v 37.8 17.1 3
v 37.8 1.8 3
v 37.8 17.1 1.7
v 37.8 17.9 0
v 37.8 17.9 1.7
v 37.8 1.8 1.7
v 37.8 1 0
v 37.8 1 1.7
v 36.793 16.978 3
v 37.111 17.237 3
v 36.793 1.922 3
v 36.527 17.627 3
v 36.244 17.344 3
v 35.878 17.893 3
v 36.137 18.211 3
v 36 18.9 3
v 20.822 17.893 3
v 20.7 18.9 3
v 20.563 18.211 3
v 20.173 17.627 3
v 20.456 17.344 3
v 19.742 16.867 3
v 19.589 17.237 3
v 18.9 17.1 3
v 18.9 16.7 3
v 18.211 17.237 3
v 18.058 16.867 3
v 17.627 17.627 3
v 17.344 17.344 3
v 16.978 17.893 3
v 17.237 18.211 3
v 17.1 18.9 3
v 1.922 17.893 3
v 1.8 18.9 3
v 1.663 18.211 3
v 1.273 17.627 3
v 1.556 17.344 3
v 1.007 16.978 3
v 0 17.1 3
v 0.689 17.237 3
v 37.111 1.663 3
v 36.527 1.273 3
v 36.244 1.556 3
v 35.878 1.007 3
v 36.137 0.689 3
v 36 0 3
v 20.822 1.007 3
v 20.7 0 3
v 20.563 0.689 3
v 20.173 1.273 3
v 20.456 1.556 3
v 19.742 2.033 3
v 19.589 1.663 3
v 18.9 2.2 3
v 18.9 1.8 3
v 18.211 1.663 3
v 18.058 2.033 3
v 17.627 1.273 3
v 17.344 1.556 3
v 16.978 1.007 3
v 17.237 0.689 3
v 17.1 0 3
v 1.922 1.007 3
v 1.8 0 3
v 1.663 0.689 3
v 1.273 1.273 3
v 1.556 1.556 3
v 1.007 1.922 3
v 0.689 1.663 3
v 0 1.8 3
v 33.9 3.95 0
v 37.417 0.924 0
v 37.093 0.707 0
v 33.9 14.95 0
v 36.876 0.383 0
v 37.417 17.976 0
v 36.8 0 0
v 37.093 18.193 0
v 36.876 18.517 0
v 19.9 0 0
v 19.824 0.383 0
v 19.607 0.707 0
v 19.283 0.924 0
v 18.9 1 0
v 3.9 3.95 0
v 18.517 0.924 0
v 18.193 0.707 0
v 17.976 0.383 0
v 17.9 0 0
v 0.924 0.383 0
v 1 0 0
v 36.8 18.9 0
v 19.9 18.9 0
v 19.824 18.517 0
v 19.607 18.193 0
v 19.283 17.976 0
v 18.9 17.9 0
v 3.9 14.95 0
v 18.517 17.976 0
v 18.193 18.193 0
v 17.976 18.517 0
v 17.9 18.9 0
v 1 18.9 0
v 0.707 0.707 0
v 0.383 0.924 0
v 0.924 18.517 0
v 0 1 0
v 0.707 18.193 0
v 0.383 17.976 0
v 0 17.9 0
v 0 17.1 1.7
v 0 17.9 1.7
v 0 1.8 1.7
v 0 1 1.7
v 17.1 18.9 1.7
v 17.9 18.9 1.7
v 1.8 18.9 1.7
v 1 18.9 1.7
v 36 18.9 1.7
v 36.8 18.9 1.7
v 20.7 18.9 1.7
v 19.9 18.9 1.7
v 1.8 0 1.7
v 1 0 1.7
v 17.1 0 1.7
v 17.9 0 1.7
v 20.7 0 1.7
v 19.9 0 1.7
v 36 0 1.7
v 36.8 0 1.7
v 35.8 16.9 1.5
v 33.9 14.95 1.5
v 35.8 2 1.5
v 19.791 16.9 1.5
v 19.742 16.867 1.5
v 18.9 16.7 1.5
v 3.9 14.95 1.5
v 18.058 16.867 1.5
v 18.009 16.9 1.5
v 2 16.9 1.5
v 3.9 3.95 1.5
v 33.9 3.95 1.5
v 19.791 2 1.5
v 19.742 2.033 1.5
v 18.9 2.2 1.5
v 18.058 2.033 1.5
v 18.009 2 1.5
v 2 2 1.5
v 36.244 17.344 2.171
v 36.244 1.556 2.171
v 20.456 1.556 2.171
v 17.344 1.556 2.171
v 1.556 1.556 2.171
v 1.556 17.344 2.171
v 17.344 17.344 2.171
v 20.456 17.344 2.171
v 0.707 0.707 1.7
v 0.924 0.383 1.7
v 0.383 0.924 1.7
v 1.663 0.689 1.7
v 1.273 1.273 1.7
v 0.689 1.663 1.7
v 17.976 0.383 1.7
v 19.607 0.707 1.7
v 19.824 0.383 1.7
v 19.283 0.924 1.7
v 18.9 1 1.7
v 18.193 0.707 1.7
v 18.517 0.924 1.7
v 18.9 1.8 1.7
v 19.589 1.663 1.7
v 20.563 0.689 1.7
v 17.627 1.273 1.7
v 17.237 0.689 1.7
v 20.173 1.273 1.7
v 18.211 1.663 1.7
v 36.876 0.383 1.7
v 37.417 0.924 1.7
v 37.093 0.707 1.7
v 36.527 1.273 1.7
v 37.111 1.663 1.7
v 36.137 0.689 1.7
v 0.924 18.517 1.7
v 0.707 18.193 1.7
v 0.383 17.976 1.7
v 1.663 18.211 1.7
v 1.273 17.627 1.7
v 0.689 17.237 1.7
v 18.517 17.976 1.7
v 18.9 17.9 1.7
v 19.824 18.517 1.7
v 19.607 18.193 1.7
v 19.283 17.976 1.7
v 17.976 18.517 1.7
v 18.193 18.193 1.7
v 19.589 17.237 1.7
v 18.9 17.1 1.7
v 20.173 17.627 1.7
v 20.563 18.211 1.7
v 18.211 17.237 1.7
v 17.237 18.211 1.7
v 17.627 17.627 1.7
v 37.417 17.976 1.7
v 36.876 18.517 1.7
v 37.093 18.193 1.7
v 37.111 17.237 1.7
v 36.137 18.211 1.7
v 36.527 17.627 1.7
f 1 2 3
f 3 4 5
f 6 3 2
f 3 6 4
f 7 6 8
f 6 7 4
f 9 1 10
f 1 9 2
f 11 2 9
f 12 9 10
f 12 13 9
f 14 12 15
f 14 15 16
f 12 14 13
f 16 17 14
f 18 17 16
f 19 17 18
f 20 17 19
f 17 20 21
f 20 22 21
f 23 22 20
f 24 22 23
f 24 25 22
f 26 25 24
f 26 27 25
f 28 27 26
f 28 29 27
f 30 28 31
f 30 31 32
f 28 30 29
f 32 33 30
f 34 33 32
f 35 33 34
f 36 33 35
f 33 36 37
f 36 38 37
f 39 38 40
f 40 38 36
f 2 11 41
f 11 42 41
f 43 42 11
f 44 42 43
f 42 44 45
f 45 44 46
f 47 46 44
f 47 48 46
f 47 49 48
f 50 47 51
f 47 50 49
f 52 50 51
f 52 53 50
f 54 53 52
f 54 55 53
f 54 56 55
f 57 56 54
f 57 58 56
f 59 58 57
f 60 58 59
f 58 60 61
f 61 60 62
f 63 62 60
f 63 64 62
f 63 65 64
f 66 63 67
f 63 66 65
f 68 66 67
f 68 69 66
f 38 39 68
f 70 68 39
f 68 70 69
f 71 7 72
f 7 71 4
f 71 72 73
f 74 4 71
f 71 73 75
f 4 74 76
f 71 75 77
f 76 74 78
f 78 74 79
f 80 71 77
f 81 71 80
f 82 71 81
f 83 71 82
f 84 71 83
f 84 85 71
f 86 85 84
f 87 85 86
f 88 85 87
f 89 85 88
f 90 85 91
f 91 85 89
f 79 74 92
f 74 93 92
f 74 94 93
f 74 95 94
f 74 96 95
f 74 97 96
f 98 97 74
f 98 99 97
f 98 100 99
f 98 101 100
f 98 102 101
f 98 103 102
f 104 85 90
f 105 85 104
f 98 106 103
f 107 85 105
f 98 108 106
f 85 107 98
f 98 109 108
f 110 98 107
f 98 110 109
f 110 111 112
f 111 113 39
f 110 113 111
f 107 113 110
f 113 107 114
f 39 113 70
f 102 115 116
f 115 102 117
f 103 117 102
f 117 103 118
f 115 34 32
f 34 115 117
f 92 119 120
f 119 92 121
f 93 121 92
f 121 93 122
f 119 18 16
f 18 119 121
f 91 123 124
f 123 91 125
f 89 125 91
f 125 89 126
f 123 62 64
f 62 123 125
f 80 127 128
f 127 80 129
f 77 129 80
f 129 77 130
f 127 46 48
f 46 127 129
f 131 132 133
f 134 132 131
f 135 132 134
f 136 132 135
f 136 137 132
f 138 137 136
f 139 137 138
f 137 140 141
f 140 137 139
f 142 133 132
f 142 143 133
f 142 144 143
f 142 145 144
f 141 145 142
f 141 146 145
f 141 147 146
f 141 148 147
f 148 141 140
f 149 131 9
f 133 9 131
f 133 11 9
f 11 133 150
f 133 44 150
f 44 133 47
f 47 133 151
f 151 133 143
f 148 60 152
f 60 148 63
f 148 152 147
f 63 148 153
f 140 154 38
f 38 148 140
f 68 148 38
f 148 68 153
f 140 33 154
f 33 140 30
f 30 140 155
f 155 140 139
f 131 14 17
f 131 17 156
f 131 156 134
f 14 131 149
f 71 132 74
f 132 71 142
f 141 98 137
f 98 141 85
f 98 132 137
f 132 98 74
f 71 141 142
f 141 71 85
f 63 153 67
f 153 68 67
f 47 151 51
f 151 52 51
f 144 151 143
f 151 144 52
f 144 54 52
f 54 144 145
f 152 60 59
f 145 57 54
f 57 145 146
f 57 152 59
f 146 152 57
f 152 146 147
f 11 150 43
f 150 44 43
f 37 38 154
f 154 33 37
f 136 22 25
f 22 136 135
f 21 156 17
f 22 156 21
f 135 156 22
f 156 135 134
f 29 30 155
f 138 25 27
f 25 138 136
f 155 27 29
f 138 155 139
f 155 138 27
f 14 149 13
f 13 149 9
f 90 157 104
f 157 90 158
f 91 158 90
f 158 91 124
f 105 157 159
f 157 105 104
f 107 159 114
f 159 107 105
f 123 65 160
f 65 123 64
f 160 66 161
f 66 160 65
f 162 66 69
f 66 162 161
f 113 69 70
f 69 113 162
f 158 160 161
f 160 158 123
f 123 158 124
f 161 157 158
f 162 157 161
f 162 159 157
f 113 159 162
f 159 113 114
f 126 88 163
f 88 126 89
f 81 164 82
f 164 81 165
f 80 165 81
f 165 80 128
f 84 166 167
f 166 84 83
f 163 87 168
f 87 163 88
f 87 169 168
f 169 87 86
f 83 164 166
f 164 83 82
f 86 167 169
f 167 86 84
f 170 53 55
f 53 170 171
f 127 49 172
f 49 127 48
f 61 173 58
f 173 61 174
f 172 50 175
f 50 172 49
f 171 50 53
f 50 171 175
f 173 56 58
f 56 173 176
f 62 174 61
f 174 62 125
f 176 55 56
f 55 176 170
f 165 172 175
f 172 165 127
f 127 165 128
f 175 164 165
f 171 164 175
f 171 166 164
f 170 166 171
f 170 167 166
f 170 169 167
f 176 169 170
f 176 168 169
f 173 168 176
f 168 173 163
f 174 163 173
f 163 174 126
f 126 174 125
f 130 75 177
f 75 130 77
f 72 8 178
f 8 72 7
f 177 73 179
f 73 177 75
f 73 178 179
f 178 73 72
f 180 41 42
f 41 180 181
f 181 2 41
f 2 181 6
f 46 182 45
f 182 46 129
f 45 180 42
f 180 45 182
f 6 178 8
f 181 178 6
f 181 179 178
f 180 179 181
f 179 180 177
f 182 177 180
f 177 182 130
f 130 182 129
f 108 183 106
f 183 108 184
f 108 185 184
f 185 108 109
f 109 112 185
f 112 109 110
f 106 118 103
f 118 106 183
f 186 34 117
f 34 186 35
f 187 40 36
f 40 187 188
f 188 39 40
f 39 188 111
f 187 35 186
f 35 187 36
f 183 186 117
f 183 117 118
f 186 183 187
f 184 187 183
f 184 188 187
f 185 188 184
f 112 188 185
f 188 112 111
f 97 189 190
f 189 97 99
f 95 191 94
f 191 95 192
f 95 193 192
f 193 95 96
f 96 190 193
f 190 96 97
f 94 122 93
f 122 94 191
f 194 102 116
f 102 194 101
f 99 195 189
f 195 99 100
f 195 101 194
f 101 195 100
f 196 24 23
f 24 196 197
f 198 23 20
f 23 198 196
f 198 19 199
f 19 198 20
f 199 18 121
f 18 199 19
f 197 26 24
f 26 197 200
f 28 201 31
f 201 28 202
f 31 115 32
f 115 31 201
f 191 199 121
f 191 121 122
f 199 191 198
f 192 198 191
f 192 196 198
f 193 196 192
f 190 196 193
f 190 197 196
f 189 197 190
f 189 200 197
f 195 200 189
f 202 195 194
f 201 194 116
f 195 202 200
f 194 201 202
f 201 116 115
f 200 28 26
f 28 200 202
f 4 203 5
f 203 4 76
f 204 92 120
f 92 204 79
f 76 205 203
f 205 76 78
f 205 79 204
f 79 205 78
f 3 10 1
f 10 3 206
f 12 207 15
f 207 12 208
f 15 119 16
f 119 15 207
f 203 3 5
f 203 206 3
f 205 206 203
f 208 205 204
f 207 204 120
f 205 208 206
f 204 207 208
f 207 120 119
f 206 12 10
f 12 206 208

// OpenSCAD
//OpenSCAD-Skript

//Moduldefinition mit Parametern für Frontplattensystem im 19mm-Raster
module FrontElem (
//Parameter
xwert=2,        //Anzahl der Segmente in horizontaler Richtung
ywert=1,        //Anzahl der Segmente in vertikaler Richtung
segment=18.9,   //Kantenlänge des Segments
hght=3.0,       //Höhe des Rands des Frontplattensegments
thick=1.5,      //verbleibende Dicke des Frontplattensegments
wo=1.0,         //Wandstärke oben
wu=2.0,         //Wandstärke unten
M3=false,       //Bohrungen für M3-Zylinderkopf-Inbusschraube
skd3=5.6,       //Schraubenkopfdurchmesser M3-Schraube
skh3=3.3,       //Schraubenkopfhöhe M3-Schraube
dsh3=3.1,       //Schaftdurchmesser M3-Schraube
dvst3=7,        //Verstärkung für M3-Schraube
B2mm=true,      //Bohrungen für 2mm-Schneidschrauben
skd2=3.6,       //Schraubenkopfdurchmesser 2mm-Schraube (4.4)
skh2=1.3,       //Schraubenkopfhöhe 2mm-Schraube
dsh2=2.0,       //Schaftdurchmesser 2mm-Schraube
dvst2=4.4,      //Verstärkung für 2mm-Schraube
Btext=6.0,      //Breite Beschriftungsband
Ltext=12,       //Länge Beschriftungsband
Dtext=0.3,      //Tiefe Beschriftungsfeld, oder Null
LEDdia=3.0,     //Durchmesser LED
LEDr=5.0,       //Kantenlänge quadratische LED
LEDB=5.0,       //Breite der Rechteck-LED
LEDH=3.0,       //Höhe der Rechteck-LED
KSWdia=6.0,     //Schaftdurchmesser Kippschalter
RSWdia=9.2,     //Schaftdurchmesser Drehschalter
RSWdist=9.4,    //Mittenabstand Pin
RSWpin=3.0,     //Durchmesser Pin
POTdia=6.8,     //Schaftdurchmesser Poti
TRMdia=4.0,     //Bohrung für Polklemme M4
TRSdia=6.0,     //Bohrung für Telefonbuchse 4mm
MCdia=11.8,     //Bohrung für MC-Buchse 4mm
MCdist=10.4,    //Abstand Abflachungen
BNCdia=9.5,     //Durchmesser Bohrung
BNCdist=8.0,    //Abstand Abflachung
PM3B=22.5,      //Breite Panelmeter 3-stellig
PM3H=14.5,      //Höhe Panelmeter 3-stellig
PM4B=30.0,      //Breite Panelmeter 4-stellig
PM4H=14.2      //Höhe Panelmeter 4-stellig

)
//Beginn Modul
{
difference(){   //difference 1
union(){        //union 1
difference(){   //difference 2
union(){        //union 2
    //alles, was vor der nächsten geschweiften Klammer steht, wird zusammengefügt (union 2)
//Körper des Frontplattensegments
cube([xwert*segment, ywert*segment, hght]);


}               //union 2 end
    //alles, was vor der nächsten geschweiften Klammer steht, wird davon abgezogen (difference 2)
//Einsenkung in das Segment
polyhedron(
               points= [[wu,wu,thick],                                  //0 unten
                        [xwert*segment-wu,wu,thick],                    //1 unten
                        [xwert*segment-wu,ywert*segment-wu,thick],      //2 unten
                        [wu,ywert*segment-wu,thick],                    //3 unten
                        [wo,wo,hght+0.01],                              //4 oben
                        [wo,ywert*segment-wo, hght+0.01],               //5 oben
                        [xwert*segment-wo,ywert*segment-wo,hght+0.01],  //6 oben
                        [xwert*segment-wo,wo,hght+0.01],                //7 oben
                       ],
               faces=  [[0,1,2,3],      //Boden
                        [0,4,7,1],      //Deckel
                        [1,7,6,2],      //Front
                        [2,6,5,3],      //Seitenwand rechts
                        [3,5,4,0],      //Rückwand
                        [4,5,6,7]]      //Seitenwand links
               );   


//Ausschnitt Schalter
translate([xwert*segment/2-30/2,ywert*segment/2-5.5,-0.1]) cube([30,11,20]);


/*
//Ausschnitt Kaltgerätestecker
translate([0,7,0]) {
//Mittenausschnitt
translate([xwert*segment/2-22/2,ywert*segment/2-14,-0.1]) cube([22,14,20]);
//Rundungen
translate([xwert*segment/2-22/2,ywert*segment/2-14,-0.1])cylinder(d=8,h=20,$fn=32);
translate([xwert*segment/2-22/2,ywert*segment/2,-0.1])cylinder(d=8,h=20,$fn=32);
translate([xwert*segment/2+22/2,ywert*segment/2-14,-0.1])cylinder(d=8,h=20,$fn=32);
translate([xwert*segment/2+22/2,ywert*segment/2,-0.1])cylinder(d=8,h=20,$fn=32);
//Seitensegmente
translate([xwert*segment/2-22/2,ywert*segment/2-0.1,-0.1]) cube([22,4+0.1,20]);
translate([xwert*segment/2-22/2,ywert*segment/2-14-4,-0.1]) cube([22,4+0.1,20]);
translate([xwert*segment/2-22/2-4,ywert*segment/2-14,-0.1]) cube([4+0.1,14,20]);
translate([xwert*segment/2+22/2-0.1,ywert*segment/2-14,-0.1]) cube([4+0.1,14,20]);
//Schraubenlöcher
translate([xwert*segment/2-36/2,ywert*segment/2-14/2,-0.1])cylinder(d=4,h=20,$fn=32);
translate([xwert*segment/2+36/2,ywert*segment/2-14/2,-0.1])cylinder(d=4,h=20,$fn=32);
*/

/*
//Bohrung für LED mittig (Mindestgröße 1x1)
translate([xwert*segment/2,ywert*segment/2-3,-0.1])  cylinder(d=LEDdia, h=10, $fn=32);
*/

/*
//Bohrung für 2x 3mm-LED nach unten versetzt mit Textfeld darüber (Mindestgröße 1x1, bei 10mm LED 1x2)
translate([xwert*segment/2-3,ywert*segment/2-3,-0.1])  cylinder(d=LEDdia, h=10, $fn=32);
translate([xwert*segment/2+3,ywert*segment/2-3,-0.1])  cylinder(d=LEDdia, h=10, $fn=32);
translate([xwert*segment/2-Ltext/2,ywert*segment/2,thick-Dtext+0.05])  cube([Ltext, Btext, Dtext]); 
*/

/*
//Bohrung für Kippschalter mittig (Mindestgröße 1x1)
translate([xwert*segment/2,ywert*segment/2,-0.1])  cylinder(d=KSWdia, h=10, $fn=32); 
*/

/*
//Bohrungen für Drehschalter mit Pin (Mindestgröße 2x2)
translate([xwert*segment/2,ywert*segment/2,-0.1])  cylinder(d=RSWdia, h=10, $fn=32);
translate([xwert*segment/2+RSWdist,ywert*segment/2,-0.1])  cylinder(d=RSWpin, h=1.5, $fn=32);
*/

/*
//Bohrung für Potentiometer 3mm-Schaft (Mindestgröße 1x1)
translate([xwert*segment/2,ywert*segment/2,-0.1])  cylinder(d=POTdia, h=10, $fn=32);
*/

/*
//Bohrung für 2x 4mm-Polklemme M4 (Mindestgröße 1x1)
translate([xwert*segment/2-10,ywert*segment/2,-0.1])  cylinder(d=TRMdia, h=10, $fn=32);
translate([xwert*segment/2+10,ywert*segment/2,-0.1])  cylinder(d=TRMdia, h=10, $fn=32);
*/
/*
//Bohrung für 4mm-Telefonbuchse (Mindestgröße 1x1)
translate([xwert*segment/2,ywert*segment/2,-0.1])  cylinder(d=TRSdia, h=10, $fn=32);
*/

/*
//Bohrung für 4mm-MC-Buchse (Mindestgröße 2x2), siehe auch union1 für Abflachungen
translate([xwert*segment/2,ywert*segment/2,-0.1])  cylinder(d=MCdia, h=10, $fn=32);
*/

/*
//Bohrung für BNC-Buchse (Mindestgröße 1x1), siehe auch union1 für Abflachungen
translate([xwert*segment/2,ywert*segment/2,-0.1])  cylinder(d=BNCdia, h=10, $fn=32);
*/

/*
//Ausschnitt Panelmeter 3-stellig (Mindestgröße 2x1)
translate([xwert*segment/2-PM3B/2,ywert*segment/2-PM3H/2,-0.1])  cube([PM3B, PM3H, 10]);
*/

/*
//Ausschnitt Panelmeter 4-stellig (Mindestgröße 2x1)
translate([xwert*segment/2-PM4B/2,ywert*segment/2-PM4H/2,-0.1])  cube([PM4B, PM4H, 10]);
*/       
        
}  //difference 2 end
    //alles, was vor der nächsten geschweiften Klammer steht, wird dazu hinzugefügt (union 1)
//Verstärkungen für Schrauben x-Achse unten
for (x=[0:segment:xwert*segment])
{
if (M3==true) translate([x,0,0]) cylinder(d=dvst3,h=hght,$fn=16);
if (B2mm==true) translate([x,0,0]) cylinder(d=dvst2,h=hght,$fn=16);
}
//Verstärkungen für Schrauben x-Achse oben
for (x=[0:segment:xwert*segment])
{
if (M3==true) translate([x,ywert*segment,0]) cylinder(d=dvst3,h=hght,$fn=16);
if (B2mm==true) translate([x,ywert*segment,0]) cylinder(d=dvst2,h=hght,$fn=16);
}
//Verstärkungen für Schrauben y-Achse links
for (y=[0:segment:ywert*segment])
{
if (M3==true) translate([0,y,0]) cylinder(d=dvst3,h=hght,$fn=16);
if (B2mm==true) translate([0,y,0]) cylinder(d=dvst2,h=hght,$fn=16);
}
//Verstärkungen für Schrauben y-Achse rechts
for (y=[0:segment:ywert*segment])
{
if (M3==true) translate([xwert*segment,y,0]) cylinder(d=dvst3,h=hght,$fn=16);
if (B2mm==true) translate([xwert*segment,y,0]) cylinder(d=dvst2,h=hght,$fn=16);
}

/*
//Abflachungen für 4mm-MC-Buchse (Mindestgröße 2x2)
translate([xwert*segment/2-5,ywert*segment/2+MCdist/2,0])  cube([10,3,thick]);
translate([xwert*segment/2-5,ywert*segment/2-MCdist/2-3,0])  cube([10,3,thick]);
*/

/*
//Abflachungen für BNC-Buchse (Mindestgröße 1x1)
translate([xwert*segment/2-5,ywert*segment/2+BNCdist/2,0])  cube([10,3,thick]);
translate([xwert*segment/2-5,ywert*segment/2-BNCdist/2-3,0])  cube([10,3,thick]);
*/

}               //union 1 end
    //alles, was vor der nächsten geschweiften Klammer steht, wird davon wieder abgezogen (difference 1)
//Bohrungen für Schrauben x-Achse unten
for (x=[0:segment:xwert*segment])
{
if (M3==true) translate([x,0,-0.1]) cylinder(d=dsh3,h=2*hght,$fn=16);
if (M3==true) translate([x,0,hght-skh3]) cylinder(d=skd3,h=2*hght,$fn=16);
if (B2mm==true) translate([x,0,-0.1]) cylinder(d=dsh2,h=2*hght,$fn=16);
if (B2mm==true) translate([x,0,hght-skh2]) cylinder(d=skd2,h=2*hght,$fn=16); 
}
//Bohrungen für Schrauben x-Achse oben
for (x=[0:segment:xwert*segment])
{
if (M3==true) translate([x,ywert*segment,-0.1]) cylinder(d=dsh3,h=2*hght,$fn=16);
if (M3==true) translate([x,ywert*segment,hght-skh3]) cylinder(d=skd3,h=2*hght,$fn=16);
if (B2mm==true) translate([x,ywert*segment,-0.1]) cylinder(d=dsh2,h=2*hght,$fn=16);
if (B2mm==true) translate([x,ywert*segment,hght-skh2]) cylinder(d=skd2,h=2*hght,$fn=16); 
}
//Bohrungen für Schrauben y-Achse links
for (y=[0:segment:ywert*segment])
{
if (M3==true) translate([0,y,-0.1]) cylinder(d=dsh3,h=2*hght,$fn=16);
if (M3==true) translate([0,y,hght-skh3]) cylinder(d=skd3,h=2*hght,$fn=16);
if (B2mm==true) translate([0,y,-0.1]) cylinder(d=dsh2,h=2*hght,$fn=16);
if (B2mm==true) translate([0,y,hght-skh2]) cylinder(d=skd2,h=2*hght,$fn=16); 
}
//Bohrungen für Schrauben y-Achse rechts
for (y=[0:segment:ywert*segment])
{
if (M3==true) translate([xwert*segment,y,-0.1]) cylinder(d=dsh3,h=2*hght,$fn=16);
if (M3==true) translate([xwert*segment,y,hght-skh3]) cylinder(d=skd3,h=2*hght,$fn=16);
if (B2mm==true) translate([xwert*segment,y,-0.1]) cylinder(d=dsh2,h=2*hght,$fn=16);
if (B2mm==true) translate([xwert*segment,y,hght-skh2]) cylinder(d=skd2,h=2*hght,$fn=16); 
}
//Abschneiden Verstärkungen unten
translate([-250,-10,-0.1])
cube([500,10,25]);
//Abschneiden Verstärkungen oben
translate([-250,ywert*segment,-0.1])
cube([500,10,25]);
//Abschneiden Verstärkungen links
translate([-10,-250,-0.1])
cube([10,500,25]);
//Abschneiden Verstärkungen rechts
translate([xwert*segment,-250,-0.1])
cube([10,500,25]);
}               //difference 1 end

}  //module end

//Hier werden Instanzen des Moduls aufgerufen
translate([0,0,0]) FrontElem();
